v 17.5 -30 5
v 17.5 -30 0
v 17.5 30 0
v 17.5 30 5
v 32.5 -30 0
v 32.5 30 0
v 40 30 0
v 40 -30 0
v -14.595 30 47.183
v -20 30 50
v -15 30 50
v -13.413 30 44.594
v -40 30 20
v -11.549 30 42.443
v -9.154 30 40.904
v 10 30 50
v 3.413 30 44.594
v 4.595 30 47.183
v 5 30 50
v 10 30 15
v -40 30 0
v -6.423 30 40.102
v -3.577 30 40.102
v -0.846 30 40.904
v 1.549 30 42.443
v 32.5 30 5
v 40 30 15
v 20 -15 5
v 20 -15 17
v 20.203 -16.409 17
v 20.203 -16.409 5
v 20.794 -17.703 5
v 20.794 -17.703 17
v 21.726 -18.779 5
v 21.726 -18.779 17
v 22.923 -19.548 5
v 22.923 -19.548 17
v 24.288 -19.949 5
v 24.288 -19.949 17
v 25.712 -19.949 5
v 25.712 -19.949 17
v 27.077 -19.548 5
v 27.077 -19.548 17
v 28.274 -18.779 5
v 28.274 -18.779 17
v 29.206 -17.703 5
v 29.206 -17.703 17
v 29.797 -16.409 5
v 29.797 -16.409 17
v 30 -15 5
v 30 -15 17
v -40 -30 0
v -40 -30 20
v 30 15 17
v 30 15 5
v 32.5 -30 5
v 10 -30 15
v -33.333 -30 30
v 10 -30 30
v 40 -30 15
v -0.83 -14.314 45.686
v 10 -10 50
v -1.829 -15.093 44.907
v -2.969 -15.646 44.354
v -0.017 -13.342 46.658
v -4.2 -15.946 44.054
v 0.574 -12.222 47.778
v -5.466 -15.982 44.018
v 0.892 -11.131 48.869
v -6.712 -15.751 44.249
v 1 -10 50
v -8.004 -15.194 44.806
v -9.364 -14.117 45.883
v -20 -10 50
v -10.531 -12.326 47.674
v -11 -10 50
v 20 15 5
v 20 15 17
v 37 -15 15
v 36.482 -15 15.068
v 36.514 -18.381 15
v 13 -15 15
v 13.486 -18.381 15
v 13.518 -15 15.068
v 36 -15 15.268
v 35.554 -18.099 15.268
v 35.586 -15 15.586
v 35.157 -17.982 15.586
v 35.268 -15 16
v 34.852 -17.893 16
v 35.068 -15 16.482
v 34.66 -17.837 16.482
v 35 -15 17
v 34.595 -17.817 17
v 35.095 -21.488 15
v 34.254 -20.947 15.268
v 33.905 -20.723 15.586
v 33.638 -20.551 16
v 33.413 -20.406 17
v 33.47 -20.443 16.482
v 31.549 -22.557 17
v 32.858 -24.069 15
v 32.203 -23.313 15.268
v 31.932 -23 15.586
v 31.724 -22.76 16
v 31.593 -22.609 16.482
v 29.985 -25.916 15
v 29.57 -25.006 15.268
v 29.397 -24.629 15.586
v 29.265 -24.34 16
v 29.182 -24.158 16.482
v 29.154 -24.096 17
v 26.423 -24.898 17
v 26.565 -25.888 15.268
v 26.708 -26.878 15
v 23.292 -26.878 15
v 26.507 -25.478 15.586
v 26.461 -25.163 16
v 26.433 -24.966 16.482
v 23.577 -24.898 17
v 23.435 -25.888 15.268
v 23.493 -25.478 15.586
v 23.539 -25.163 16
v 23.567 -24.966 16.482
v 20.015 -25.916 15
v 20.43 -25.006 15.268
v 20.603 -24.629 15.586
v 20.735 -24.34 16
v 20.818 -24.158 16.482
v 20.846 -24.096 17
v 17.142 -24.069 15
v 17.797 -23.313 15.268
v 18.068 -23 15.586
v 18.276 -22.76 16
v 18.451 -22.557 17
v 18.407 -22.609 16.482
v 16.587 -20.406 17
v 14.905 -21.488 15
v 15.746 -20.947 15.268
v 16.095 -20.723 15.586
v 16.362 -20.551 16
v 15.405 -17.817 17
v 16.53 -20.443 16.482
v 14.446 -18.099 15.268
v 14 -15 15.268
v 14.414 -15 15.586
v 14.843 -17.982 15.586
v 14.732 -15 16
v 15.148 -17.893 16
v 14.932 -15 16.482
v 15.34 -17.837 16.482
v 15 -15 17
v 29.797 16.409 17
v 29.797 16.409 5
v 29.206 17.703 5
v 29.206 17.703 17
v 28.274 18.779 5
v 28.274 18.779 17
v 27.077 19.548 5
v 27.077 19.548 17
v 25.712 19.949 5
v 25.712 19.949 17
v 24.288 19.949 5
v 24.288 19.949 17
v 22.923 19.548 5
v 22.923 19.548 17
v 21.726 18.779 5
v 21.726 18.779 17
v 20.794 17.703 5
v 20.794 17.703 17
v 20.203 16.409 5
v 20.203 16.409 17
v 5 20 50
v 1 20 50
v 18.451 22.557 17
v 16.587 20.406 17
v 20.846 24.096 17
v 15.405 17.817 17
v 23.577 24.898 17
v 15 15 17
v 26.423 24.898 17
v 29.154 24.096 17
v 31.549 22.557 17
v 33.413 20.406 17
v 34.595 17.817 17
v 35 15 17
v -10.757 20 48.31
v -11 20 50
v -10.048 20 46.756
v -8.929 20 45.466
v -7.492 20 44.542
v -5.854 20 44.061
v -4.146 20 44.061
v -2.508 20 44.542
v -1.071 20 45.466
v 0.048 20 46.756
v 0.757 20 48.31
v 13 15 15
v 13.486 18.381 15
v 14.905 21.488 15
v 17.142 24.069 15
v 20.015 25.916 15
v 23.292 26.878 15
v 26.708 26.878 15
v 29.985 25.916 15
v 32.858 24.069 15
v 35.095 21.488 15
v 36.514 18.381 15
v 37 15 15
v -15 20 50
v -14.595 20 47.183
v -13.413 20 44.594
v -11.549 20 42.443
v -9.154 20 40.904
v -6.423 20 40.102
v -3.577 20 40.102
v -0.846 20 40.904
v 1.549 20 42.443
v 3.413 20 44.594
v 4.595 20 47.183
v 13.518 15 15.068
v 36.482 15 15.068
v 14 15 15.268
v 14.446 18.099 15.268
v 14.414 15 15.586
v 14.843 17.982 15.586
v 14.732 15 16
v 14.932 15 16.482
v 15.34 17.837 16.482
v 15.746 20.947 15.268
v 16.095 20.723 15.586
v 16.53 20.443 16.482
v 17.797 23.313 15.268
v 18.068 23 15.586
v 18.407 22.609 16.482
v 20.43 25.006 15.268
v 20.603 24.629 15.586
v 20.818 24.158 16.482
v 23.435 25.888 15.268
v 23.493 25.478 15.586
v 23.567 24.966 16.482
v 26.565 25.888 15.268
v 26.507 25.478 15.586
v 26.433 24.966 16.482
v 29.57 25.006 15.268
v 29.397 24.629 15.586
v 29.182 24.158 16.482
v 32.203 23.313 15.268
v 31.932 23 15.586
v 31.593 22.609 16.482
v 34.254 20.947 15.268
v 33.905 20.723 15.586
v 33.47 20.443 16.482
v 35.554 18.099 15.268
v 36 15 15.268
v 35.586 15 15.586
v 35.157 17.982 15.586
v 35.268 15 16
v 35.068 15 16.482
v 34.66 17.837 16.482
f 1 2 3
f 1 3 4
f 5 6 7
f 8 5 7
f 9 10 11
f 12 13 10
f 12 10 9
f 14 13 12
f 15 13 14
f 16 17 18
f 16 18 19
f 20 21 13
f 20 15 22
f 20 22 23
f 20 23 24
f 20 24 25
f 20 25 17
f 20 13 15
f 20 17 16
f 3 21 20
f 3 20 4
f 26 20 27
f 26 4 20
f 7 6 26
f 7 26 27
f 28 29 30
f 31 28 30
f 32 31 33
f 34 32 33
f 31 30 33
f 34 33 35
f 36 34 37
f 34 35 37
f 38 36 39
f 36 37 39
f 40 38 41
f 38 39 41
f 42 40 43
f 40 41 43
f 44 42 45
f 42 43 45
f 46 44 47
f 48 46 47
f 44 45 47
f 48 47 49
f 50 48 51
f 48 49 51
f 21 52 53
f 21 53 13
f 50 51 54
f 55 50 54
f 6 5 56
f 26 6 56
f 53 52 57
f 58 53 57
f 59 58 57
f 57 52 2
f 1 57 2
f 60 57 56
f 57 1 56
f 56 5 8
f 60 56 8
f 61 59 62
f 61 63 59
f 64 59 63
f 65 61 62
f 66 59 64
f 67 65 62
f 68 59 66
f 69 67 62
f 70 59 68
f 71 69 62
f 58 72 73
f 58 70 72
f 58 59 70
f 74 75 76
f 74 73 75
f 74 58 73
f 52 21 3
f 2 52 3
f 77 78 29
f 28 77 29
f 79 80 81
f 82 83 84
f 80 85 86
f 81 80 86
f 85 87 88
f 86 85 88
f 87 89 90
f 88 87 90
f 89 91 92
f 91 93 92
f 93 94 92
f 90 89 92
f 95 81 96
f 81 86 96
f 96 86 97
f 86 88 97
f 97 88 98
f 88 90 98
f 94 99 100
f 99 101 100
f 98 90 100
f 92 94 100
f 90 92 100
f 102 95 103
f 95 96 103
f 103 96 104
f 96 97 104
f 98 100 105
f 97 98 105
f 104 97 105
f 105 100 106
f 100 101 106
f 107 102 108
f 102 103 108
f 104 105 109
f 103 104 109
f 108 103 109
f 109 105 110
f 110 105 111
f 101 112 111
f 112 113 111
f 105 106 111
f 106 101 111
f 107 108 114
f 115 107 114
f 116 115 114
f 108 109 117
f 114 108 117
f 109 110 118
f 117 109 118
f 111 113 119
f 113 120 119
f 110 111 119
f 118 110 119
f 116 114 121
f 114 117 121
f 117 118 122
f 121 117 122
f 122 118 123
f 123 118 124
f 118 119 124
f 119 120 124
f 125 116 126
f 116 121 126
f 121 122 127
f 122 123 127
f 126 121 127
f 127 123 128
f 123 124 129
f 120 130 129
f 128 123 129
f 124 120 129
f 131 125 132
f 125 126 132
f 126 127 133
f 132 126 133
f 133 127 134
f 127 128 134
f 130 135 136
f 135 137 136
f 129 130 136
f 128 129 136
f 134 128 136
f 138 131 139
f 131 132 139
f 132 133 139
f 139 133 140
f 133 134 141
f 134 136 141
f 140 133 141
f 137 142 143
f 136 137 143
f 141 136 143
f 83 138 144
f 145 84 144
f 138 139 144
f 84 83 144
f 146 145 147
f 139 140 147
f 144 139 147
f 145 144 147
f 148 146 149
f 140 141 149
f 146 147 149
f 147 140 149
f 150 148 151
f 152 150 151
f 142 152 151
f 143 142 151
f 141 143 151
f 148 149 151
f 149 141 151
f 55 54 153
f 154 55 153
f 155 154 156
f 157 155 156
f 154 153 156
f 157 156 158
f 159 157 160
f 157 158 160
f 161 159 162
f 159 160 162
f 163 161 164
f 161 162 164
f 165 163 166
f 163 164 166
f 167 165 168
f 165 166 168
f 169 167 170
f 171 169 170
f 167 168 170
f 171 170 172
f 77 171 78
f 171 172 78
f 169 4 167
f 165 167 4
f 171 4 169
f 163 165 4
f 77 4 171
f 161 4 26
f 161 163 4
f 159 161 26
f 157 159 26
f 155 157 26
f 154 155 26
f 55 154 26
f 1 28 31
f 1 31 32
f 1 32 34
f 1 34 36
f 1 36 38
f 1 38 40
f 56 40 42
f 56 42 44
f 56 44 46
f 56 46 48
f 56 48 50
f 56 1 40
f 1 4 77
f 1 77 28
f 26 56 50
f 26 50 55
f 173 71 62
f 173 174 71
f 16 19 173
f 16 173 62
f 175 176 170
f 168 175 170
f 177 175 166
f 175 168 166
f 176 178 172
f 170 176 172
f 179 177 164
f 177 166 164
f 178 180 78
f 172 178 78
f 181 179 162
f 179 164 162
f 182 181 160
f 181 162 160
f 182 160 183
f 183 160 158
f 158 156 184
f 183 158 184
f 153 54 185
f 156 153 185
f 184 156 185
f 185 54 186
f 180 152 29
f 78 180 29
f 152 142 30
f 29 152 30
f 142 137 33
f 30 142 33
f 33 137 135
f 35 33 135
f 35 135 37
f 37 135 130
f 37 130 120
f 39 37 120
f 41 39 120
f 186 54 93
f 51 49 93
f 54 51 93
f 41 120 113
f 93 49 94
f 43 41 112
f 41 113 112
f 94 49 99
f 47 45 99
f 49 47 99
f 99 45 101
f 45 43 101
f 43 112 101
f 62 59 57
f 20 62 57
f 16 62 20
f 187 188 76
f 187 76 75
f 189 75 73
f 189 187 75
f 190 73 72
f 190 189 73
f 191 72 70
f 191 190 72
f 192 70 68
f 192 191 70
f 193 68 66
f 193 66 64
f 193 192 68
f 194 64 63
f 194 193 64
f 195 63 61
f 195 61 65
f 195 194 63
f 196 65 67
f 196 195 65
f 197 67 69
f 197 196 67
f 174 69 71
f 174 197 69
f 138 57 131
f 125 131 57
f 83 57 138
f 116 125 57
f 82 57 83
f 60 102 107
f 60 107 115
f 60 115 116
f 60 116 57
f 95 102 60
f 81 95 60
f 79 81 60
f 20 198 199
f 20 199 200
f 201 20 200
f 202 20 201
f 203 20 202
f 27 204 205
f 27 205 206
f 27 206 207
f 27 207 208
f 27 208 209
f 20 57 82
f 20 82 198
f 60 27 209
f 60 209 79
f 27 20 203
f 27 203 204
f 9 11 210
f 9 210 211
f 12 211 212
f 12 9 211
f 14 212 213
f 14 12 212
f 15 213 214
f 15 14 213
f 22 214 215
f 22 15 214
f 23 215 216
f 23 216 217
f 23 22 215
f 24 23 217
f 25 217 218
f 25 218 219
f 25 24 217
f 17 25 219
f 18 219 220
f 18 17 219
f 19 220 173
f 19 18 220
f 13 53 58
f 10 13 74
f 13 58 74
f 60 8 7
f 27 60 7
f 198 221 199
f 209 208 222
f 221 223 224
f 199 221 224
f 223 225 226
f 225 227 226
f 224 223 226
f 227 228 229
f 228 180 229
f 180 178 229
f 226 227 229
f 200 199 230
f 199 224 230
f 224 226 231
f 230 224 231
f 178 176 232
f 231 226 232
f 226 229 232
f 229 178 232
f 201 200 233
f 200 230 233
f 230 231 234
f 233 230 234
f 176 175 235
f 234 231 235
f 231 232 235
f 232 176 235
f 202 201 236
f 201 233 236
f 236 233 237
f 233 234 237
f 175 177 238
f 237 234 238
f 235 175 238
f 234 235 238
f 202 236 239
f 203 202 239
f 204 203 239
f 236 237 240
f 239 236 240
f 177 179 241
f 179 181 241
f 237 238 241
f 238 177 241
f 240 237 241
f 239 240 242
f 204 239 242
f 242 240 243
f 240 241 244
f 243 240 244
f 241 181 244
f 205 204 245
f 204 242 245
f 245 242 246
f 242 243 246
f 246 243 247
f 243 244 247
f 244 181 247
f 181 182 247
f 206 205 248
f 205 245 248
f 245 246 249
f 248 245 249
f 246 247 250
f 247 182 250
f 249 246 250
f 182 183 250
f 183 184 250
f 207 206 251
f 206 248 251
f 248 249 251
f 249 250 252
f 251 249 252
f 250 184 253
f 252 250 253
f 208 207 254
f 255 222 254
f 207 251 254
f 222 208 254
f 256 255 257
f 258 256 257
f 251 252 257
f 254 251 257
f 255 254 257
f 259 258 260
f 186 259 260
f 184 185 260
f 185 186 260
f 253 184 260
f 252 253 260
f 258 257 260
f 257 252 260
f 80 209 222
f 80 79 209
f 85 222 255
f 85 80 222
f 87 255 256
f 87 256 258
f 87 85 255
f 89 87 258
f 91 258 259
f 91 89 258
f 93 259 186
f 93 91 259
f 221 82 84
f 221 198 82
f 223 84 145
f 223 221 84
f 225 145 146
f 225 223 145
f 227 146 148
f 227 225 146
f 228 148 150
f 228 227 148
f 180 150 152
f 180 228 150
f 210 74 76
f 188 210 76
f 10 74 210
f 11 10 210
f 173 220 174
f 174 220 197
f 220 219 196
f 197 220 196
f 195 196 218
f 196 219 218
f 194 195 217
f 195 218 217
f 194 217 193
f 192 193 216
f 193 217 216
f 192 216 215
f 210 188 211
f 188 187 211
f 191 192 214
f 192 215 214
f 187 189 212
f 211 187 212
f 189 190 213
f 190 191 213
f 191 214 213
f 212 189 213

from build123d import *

# Parameters (mm, degrees)
F0_W         = 80
F0_H         = 60
F1_DEPTH     = 50
F2_W         = 30
F2_H         = 33
F3_DEPTH     = 60.001
F5_DEPTH     = 17.001
F6_W         = 30
F6_H         = 60
F7_DEPTH     = 2
F8_W         = 15
F8_H         = 5
F9_DEPTH     = 60.001
F10_R        = 1.99999
F12_DEPTH    = 60.001
F13_W        = 6
F13_H        = 48.9288835973
F15_W        = 4
F15_H        = 10
F17_T1_DEPTH = 132.8673195186


# Not quite as in the source:
# - a fillet or chamfer that OpenCascade refuses, or shapes differently, is made with other operations: its cross-section is extruded or revolved along the edge and cut away or added
# - a fillet or chamfer is up to 0.001 mm smaller than in the source, because OpenCascade refuses the exact size


with BuildPart() as f1:
    # F0 (on Top) → F1 (new body)
    with BuildSketch(Plane.XY):
        Rectangle(F0_W, F0_H)
    extrude(amount=F1_DEPTH)

    # F2 (on face) → F3 (cut, through all)
    with BuildSketch(Plane.XZ.offset(30)):
        with Locations((25, 33.5)):
            Rectangle(F2_W, F2_H)
    extrude(amount=-F3_DEPTH, mode=Mode.SUBTRACT)

    # F4 (on face) → F5 (cut, through all)
    with BuildSketch(Plane.XY.offset(17)):
        with BuildLine():
            ThreePointArc((20, -15), (25, -20), (30, -15))
            Line((30, -15), (30, 15))
            ThreePointArc((30, 15), (25, 20), (20, 15))
            Line((20, 15), (20, -15))
        make_face()
    extrude(amount=-F5_DEPTH, mode=Mode.SUBTRACT)

    # F6 (on face) → F7 (cut)
    with BuildSketch(Plane.XY.offset(17)):
        with Locations((25, 0)):
            Rectangle(F6_W, F6_H)
        with BuildLine():
            Line((35, 15), (35, -15))
            ThreePointArc((35, -15), (25, -25), (15, -15))
            Line((15, -15), (15, 15))
            ThreePointArc((15, 15), (25, 25), (35, 15))
        make_face(mode=Mode.SUBTRACT)
    extrude(amount=-F7_DEPTH, mode=Mode.SUBTRACT)

    # F8 (on face) → F9 (cut, through all)
    with BuildSketch(Plane.XZ.offset(30)):
        with Locations((25, 2.5)):
            Rectangle(F8_W, F8_H)
    extrude(amount=-F9_DEPTH, mode=Mode.SUBTRACT)

    # F10 (radius 2 in the source; OpenCascade refuses exactly that, so slightly less here)
    f10_edges = [f1.edges().sort_by_distance(p)[0] for p in [
        (35, 0, 15),
    ]]
    fillet(f10_edges, radius=F10_R)

    # F11 (on face) → F12 (cut, through all)
    with BuildSketch(Plane.XZ.offset(30)):
        Polygon((-40, 20), (-20, 50), (-40, 50), align=None)
    extrude(amount=-F12_DEPTH, mode=Mode.SUBTRACT)

    # F13 (on face) → F14 (revolve, cut)
    with BuildSketch(Plane.XY.offset(50)):
        with Locations((-8, 5.5355582014)):
            Rectangle(F13_W, F13_H)
    revolve(axis=Axis((-5, -1.603256911, 50), (0, -1, 0)), mode=Mode.SUBTRACT)

    # F15 (on face) → F16 (revolve, cut)
    with BuildSketch(Plane.XY.offset(50)):
        with Locations((-13, 25)):
            Rectangle(F15_W, F15_H)
    revolve(axis=Axis((-5, 25, 50), (0, -1, 0)), mode=Mode.SUBTRACT)

    # F17: chamfer of 20 on 1 edges, made by hand

    # F17_s2 → F17_t1 (cut)
    with BuildSketch(Plane.YZ.offset(-71.4336597593)):
        Polygon((-30, 30), (-10, 50), (-30, 50), align=None)
    extrude(amount=F17_T1_DEPTH, mode=Mode.SUBTRACT)


solid = f1.part
